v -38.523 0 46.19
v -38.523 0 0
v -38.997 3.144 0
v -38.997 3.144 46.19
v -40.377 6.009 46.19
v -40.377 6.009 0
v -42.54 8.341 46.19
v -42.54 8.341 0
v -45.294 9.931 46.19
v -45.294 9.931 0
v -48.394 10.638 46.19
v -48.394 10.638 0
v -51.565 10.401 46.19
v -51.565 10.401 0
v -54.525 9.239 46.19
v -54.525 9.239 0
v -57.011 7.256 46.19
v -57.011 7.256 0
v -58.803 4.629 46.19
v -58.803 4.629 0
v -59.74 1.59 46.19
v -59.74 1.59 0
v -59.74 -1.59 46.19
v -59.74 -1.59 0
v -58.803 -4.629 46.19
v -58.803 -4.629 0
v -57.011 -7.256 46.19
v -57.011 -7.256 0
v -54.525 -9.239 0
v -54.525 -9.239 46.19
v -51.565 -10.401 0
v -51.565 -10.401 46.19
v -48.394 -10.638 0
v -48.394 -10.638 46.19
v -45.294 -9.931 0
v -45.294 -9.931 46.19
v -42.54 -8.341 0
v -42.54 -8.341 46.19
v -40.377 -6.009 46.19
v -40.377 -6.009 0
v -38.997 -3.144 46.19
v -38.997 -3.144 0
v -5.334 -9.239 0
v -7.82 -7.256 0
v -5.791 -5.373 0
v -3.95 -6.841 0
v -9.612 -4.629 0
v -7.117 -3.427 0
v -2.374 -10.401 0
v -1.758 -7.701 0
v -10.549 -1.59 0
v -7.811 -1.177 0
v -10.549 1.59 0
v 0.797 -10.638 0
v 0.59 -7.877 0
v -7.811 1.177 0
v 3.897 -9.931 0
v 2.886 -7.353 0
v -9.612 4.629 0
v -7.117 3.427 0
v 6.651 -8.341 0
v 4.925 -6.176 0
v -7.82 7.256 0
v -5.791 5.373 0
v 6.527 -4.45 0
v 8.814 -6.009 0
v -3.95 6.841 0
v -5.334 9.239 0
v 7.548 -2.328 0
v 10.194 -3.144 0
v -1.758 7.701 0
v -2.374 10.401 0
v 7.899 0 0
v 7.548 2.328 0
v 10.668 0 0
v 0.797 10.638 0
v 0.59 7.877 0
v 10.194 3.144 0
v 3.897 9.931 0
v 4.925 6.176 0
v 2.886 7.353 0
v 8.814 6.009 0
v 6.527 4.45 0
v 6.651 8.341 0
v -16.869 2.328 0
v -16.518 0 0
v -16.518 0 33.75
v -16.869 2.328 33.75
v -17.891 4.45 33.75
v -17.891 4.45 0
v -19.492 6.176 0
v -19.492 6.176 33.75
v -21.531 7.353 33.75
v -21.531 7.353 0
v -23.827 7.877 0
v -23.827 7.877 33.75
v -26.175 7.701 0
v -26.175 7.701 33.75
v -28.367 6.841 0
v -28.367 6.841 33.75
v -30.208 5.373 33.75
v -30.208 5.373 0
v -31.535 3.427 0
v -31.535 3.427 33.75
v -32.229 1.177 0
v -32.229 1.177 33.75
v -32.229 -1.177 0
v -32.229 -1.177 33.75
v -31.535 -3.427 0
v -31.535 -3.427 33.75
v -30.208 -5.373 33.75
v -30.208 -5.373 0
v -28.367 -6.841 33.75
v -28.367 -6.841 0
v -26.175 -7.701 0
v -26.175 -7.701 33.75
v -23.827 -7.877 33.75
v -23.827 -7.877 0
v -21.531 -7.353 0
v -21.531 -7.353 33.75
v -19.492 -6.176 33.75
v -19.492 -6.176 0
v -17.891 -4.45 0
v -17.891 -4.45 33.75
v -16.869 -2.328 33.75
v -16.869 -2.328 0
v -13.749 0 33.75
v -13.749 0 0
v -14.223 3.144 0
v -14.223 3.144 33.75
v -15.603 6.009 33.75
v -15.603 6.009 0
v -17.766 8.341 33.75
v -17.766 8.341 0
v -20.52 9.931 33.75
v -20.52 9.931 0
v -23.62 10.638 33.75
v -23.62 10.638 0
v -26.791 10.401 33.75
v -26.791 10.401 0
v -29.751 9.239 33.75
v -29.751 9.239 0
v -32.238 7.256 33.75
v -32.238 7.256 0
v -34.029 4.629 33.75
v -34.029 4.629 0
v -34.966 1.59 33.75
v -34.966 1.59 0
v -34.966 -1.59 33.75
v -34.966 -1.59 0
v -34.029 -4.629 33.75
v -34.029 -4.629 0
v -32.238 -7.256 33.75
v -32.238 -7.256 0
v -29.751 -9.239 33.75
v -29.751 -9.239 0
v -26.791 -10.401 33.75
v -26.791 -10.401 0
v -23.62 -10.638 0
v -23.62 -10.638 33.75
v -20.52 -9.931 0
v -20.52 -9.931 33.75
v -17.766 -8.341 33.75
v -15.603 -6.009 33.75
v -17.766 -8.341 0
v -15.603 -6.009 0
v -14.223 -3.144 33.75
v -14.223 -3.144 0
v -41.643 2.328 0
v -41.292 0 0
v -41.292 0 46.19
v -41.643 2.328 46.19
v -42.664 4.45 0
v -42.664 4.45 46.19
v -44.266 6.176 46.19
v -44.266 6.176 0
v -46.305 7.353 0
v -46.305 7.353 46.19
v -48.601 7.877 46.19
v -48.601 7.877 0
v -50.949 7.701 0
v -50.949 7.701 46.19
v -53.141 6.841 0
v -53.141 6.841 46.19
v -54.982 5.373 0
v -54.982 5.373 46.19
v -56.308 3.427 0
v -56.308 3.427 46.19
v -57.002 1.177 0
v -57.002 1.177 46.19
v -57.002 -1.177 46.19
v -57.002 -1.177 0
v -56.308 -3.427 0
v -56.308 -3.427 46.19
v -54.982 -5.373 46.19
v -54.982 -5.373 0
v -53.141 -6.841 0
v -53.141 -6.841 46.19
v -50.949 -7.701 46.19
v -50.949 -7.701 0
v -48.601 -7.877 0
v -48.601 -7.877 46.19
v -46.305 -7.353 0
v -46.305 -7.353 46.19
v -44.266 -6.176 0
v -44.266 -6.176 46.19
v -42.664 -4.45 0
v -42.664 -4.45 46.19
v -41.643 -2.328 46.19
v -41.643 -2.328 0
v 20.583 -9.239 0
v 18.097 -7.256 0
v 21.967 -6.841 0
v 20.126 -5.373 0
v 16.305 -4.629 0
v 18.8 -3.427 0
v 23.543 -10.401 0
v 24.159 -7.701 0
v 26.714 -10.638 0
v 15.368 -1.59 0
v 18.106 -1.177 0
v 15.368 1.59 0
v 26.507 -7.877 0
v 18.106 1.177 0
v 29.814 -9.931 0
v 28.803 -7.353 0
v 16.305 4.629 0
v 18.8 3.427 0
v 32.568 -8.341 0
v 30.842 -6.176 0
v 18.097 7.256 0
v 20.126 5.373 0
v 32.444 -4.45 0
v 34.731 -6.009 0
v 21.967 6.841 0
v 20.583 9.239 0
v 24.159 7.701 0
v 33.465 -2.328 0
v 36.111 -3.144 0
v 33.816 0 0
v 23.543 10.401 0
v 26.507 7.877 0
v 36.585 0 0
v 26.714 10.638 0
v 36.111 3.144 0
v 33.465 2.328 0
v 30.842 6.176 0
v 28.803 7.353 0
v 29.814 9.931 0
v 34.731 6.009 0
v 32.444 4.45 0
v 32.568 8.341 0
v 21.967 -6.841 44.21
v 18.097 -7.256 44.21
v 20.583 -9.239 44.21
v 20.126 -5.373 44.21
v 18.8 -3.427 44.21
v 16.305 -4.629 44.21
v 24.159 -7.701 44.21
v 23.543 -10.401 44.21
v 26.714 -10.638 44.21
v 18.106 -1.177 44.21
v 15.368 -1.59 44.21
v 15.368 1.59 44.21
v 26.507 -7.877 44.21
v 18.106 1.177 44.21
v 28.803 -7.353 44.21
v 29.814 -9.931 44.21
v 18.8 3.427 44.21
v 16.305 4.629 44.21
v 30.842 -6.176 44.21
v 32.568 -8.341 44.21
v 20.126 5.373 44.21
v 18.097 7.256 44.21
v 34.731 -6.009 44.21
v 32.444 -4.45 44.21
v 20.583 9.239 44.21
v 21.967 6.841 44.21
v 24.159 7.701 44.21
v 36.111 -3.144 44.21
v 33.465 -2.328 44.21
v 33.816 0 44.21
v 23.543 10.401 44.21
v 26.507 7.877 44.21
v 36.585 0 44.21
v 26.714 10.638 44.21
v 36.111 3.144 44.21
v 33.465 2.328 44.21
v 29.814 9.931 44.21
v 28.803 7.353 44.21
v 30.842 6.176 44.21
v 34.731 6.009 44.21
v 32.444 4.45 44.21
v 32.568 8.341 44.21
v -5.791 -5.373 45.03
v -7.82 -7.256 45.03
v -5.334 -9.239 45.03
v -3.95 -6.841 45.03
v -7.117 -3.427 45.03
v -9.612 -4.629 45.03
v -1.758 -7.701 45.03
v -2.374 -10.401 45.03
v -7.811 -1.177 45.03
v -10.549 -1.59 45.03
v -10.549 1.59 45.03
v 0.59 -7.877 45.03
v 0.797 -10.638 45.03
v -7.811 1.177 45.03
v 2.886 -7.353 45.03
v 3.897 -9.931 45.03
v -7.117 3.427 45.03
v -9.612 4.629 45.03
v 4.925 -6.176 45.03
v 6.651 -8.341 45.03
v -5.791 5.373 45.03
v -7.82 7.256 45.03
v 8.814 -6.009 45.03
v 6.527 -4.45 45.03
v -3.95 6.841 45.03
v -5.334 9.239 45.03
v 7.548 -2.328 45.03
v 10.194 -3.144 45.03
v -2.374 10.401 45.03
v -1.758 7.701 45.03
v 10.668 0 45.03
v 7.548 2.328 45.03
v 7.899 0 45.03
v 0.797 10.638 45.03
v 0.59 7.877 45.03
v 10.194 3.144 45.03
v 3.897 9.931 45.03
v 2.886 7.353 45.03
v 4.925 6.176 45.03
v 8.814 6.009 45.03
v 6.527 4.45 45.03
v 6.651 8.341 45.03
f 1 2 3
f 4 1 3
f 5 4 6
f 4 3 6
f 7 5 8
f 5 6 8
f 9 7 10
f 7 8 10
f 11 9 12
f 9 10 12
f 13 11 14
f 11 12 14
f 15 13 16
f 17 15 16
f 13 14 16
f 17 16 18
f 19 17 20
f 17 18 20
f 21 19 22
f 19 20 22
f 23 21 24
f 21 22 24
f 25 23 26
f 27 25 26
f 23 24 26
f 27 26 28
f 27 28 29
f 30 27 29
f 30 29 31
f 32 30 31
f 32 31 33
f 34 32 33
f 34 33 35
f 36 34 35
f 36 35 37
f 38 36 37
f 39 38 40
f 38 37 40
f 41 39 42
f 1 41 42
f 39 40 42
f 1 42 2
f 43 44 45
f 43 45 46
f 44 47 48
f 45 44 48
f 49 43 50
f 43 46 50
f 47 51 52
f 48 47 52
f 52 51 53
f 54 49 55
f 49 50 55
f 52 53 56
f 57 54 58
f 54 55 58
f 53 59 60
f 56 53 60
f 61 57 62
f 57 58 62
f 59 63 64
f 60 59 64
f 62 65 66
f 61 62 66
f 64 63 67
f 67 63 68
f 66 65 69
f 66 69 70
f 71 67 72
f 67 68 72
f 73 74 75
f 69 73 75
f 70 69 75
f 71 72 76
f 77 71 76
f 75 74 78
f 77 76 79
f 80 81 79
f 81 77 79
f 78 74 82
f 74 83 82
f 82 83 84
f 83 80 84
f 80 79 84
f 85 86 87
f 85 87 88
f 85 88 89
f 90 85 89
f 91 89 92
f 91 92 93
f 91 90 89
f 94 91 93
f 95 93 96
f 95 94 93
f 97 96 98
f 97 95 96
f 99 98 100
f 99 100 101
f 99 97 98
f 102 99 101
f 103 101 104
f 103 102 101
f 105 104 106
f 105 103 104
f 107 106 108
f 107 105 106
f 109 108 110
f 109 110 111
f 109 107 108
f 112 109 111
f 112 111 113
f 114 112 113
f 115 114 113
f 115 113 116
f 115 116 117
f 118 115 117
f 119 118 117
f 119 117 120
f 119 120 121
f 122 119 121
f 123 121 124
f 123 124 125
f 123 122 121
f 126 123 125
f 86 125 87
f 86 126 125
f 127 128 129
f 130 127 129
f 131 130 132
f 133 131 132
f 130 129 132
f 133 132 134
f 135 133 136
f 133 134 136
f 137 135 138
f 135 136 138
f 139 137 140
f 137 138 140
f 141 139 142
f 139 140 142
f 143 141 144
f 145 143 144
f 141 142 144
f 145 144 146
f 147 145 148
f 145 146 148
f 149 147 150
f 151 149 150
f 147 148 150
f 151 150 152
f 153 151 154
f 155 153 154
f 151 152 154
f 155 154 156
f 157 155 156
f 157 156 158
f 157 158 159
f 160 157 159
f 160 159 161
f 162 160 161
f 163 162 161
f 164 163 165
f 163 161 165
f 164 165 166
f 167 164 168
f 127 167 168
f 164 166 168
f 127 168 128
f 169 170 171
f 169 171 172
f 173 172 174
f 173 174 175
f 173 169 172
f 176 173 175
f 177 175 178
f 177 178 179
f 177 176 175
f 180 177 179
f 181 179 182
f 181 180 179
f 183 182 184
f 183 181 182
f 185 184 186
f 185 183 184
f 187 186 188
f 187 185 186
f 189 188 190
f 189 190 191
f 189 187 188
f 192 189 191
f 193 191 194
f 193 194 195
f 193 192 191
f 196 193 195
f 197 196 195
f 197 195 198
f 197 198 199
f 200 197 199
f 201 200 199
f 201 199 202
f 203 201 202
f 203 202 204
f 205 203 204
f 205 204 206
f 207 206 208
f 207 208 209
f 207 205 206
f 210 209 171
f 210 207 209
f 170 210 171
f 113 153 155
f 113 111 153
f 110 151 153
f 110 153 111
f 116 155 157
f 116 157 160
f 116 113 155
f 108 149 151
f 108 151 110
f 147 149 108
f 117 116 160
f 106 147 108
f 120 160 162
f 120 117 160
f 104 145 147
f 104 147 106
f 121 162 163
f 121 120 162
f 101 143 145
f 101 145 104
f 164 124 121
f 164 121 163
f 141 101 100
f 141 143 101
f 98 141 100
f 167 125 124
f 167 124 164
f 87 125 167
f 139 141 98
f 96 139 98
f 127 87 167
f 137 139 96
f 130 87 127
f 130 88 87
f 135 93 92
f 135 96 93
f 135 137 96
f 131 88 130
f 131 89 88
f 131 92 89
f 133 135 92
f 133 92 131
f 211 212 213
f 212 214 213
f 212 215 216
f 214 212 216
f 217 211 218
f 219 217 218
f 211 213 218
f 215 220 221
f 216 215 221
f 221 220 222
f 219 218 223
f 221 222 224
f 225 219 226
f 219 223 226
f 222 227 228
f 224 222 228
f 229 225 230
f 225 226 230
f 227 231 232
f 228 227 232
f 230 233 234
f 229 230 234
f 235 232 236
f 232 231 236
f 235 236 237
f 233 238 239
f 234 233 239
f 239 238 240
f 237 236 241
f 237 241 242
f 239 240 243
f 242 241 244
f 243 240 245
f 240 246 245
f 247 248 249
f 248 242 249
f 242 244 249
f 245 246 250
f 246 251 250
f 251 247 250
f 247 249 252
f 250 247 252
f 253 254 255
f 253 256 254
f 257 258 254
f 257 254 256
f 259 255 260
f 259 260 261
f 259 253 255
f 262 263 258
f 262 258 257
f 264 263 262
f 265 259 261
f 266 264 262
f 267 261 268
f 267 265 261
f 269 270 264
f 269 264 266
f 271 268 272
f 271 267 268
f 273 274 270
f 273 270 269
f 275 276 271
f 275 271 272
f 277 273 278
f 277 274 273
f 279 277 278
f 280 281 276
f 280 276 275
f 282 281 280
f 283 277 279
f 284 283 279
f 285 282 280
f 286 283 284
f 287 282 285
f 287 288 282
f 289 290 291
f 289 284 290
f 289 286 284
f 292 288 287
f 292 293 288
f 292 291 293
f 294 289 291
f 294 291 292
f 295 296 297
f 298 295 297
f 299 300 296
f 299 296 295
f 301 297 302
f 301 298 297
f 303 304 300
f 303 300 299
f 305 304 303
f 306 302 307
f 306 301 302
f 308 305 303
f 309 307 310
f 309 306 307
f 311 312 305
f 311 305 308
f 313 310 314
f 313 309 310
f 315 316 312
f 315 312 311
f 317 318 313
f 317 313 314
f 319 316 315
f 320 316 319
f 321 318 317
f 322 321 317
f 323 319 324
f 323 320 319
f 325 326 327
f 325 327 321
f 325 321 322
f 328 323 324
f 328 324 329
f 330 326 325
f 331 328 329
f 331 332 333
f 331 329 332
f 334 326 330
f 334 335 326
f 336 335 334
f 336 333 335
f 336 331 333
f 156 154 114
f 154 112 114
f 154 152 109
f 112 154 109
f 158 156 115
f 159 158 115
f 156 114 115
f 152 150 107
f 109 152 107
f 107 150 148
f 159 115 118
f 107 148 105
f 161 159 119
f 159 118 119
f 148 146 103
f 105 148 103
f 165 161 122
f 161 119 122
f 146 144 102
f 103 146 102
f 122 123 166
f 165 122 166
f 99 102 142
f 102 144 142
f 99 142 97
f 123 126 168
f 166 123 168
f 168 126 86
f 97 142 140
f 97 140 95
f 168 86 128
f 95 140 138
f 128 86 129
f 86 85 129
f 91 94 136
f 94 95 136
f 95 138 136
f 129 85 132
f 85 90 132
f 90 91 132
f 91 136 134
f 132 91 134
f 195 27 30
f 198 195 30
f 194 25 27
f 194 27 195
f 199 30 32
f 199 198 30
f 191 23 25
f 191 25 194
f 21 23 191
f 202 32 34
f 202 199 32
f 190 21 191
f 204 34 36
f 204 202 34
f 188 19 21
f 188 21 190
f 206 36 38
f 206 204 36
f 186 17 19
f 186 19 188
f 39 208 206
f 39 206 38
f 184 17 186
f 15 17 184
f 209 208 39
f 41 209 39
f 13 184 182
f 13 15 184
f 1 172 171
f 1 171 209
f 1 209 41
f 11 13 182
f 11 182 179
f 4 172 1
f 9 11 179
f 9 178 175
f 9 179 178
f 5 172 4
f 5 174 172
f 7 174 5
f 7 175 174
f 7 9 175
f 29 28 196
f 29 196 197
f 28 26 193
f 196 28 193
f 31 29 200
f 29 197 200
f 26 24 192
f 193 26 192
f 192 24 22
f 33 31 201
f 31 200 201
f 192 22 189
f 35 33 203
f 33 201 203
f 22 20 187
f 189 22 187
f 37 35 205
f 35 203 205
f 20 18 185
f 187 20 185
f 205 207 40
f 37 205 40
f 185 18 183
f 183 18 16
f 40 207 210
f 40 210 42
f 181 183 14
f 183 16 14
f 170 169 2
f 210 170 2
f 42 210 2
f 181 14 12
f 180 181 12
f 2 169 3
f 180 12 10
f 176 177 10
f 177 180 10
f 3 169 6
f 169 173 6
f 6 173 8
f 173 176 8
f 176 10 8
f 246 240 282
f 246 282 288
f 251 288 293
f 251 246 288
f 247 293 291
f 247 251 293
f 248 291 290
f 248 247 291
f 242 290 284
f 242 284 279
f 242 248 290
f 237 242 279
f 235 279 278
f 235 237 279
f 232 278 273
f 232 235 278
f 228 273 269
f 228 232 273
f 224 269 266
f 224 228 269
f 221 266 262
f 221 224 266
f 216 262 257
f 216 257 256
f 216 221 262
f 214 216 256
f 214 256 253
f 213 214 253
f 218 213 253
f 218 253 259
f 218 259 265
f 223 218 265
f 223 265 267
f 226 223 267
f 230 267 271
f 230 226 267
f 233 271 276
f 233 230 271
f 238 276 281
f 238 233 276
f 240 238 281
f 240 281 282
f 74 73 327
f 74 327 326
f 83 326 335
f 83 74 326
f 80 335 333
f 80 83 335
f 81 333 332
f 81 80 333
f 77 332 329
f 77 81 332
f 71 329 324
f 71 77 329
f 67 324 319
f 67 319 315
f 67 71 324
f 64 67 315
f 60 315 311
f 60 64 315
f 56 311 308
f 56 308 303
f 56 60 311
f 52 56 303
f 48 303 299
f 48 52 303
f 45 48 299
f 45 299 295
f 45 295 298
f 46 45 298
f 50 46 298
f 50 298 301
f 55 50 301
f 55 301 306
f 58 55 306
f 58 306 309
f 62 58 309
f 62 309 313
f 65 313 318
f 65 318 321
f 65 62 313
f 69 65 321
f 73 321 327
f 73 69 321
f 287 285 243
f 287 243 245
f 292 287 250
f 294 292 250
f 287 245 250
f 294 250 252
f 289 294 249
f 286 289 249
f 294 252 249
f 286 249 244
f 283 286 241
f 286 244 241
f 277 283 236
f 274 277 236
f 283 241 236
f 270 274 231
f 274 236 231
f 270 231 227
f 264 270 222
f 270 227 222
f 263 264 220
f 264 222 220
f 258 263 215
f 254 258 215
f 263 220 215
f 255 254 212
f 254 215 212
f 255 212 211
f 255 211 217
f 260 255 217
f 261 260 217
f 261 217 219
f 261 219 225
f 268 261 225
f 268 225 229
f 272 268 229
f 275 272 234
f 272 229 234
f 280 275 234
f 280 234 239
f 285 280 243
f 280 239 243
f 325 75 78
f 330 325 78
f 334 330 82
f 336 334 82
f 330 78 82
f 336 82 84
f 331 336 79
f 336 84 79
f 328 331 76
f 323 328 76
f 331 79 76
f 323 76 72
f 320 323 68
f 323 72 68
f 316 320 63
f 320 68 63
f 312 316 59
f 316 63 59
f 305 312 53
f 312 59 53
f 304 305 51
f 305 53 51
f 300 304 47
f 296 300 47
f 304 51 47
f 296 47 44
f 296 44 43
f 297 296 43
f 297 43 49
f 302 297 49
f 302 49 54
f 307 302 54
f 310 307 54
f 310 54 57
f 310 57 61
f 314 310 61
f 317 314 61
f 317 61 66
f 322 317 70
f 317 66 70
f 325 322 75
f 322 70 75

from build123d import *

# Parameters (mm, degrees)
F0_R     = 10.668
F0_R_2   = 7.8994
F1_DEPTH = 45.03
F2_R     = 10.668
F2_R_2   = 7.8994
F3_DEPTH = 33.75
F4_R     = 10.668
F4_R_2   = 7.8994
F5_DEPTH = 44.21
F6_R     = 10.668
F6_R_2   = 7.8994
F7_DEPTH = 46.19


with BuildPart() as f1:
    # F0 (on Top) → F1 (new body)
    with BuildSketch(Plane.XY):
        Circle(F0_R)
        Circle(F0_R_2, mode=Mode.SUBTRACT)
    extrude(amount=F1_DEPTH)


with BuildPart() as f3:
    # F2 (on Top) → F3 (new body)
    with BuildSketch(Plane.XY):
        with Locations((-24.417456, 0)):
            Circle(F2_R)
        with Locations((-24.417456, 0)):
            Circle(F2_R_2, mode=Mode.SUBTRACT)
    extrude(amount=F3_DEPTH)


with BuildPart() as f5:
    # F4 (on Top) → F5 (new body)
    with BuildSketch(Plane.XY):
        with Locations((25.916765, 0)):
            Circle(F4_R)
        with Locations((25.916765, 0)):
            Circle(F4_R_2, mode=Mode.SUBTRACT)
    extrude(amount=F5_DEPTH)


with BuildPart() as f7:
    # F6 (on Top) → F7 (new body)
    with BuildSketch(Plane.XY):
        with Locations((-49.191229, 0)):
            Circle(F6_R)
        with Locations((-49.191229, 0)):
            Circle(F6_R_2, mode=Mode.SUBTRACT)
    extrude(amount=F7_DEPTH)


solid = Compound([f1.part, f3.part, f5.part, f7.part])
